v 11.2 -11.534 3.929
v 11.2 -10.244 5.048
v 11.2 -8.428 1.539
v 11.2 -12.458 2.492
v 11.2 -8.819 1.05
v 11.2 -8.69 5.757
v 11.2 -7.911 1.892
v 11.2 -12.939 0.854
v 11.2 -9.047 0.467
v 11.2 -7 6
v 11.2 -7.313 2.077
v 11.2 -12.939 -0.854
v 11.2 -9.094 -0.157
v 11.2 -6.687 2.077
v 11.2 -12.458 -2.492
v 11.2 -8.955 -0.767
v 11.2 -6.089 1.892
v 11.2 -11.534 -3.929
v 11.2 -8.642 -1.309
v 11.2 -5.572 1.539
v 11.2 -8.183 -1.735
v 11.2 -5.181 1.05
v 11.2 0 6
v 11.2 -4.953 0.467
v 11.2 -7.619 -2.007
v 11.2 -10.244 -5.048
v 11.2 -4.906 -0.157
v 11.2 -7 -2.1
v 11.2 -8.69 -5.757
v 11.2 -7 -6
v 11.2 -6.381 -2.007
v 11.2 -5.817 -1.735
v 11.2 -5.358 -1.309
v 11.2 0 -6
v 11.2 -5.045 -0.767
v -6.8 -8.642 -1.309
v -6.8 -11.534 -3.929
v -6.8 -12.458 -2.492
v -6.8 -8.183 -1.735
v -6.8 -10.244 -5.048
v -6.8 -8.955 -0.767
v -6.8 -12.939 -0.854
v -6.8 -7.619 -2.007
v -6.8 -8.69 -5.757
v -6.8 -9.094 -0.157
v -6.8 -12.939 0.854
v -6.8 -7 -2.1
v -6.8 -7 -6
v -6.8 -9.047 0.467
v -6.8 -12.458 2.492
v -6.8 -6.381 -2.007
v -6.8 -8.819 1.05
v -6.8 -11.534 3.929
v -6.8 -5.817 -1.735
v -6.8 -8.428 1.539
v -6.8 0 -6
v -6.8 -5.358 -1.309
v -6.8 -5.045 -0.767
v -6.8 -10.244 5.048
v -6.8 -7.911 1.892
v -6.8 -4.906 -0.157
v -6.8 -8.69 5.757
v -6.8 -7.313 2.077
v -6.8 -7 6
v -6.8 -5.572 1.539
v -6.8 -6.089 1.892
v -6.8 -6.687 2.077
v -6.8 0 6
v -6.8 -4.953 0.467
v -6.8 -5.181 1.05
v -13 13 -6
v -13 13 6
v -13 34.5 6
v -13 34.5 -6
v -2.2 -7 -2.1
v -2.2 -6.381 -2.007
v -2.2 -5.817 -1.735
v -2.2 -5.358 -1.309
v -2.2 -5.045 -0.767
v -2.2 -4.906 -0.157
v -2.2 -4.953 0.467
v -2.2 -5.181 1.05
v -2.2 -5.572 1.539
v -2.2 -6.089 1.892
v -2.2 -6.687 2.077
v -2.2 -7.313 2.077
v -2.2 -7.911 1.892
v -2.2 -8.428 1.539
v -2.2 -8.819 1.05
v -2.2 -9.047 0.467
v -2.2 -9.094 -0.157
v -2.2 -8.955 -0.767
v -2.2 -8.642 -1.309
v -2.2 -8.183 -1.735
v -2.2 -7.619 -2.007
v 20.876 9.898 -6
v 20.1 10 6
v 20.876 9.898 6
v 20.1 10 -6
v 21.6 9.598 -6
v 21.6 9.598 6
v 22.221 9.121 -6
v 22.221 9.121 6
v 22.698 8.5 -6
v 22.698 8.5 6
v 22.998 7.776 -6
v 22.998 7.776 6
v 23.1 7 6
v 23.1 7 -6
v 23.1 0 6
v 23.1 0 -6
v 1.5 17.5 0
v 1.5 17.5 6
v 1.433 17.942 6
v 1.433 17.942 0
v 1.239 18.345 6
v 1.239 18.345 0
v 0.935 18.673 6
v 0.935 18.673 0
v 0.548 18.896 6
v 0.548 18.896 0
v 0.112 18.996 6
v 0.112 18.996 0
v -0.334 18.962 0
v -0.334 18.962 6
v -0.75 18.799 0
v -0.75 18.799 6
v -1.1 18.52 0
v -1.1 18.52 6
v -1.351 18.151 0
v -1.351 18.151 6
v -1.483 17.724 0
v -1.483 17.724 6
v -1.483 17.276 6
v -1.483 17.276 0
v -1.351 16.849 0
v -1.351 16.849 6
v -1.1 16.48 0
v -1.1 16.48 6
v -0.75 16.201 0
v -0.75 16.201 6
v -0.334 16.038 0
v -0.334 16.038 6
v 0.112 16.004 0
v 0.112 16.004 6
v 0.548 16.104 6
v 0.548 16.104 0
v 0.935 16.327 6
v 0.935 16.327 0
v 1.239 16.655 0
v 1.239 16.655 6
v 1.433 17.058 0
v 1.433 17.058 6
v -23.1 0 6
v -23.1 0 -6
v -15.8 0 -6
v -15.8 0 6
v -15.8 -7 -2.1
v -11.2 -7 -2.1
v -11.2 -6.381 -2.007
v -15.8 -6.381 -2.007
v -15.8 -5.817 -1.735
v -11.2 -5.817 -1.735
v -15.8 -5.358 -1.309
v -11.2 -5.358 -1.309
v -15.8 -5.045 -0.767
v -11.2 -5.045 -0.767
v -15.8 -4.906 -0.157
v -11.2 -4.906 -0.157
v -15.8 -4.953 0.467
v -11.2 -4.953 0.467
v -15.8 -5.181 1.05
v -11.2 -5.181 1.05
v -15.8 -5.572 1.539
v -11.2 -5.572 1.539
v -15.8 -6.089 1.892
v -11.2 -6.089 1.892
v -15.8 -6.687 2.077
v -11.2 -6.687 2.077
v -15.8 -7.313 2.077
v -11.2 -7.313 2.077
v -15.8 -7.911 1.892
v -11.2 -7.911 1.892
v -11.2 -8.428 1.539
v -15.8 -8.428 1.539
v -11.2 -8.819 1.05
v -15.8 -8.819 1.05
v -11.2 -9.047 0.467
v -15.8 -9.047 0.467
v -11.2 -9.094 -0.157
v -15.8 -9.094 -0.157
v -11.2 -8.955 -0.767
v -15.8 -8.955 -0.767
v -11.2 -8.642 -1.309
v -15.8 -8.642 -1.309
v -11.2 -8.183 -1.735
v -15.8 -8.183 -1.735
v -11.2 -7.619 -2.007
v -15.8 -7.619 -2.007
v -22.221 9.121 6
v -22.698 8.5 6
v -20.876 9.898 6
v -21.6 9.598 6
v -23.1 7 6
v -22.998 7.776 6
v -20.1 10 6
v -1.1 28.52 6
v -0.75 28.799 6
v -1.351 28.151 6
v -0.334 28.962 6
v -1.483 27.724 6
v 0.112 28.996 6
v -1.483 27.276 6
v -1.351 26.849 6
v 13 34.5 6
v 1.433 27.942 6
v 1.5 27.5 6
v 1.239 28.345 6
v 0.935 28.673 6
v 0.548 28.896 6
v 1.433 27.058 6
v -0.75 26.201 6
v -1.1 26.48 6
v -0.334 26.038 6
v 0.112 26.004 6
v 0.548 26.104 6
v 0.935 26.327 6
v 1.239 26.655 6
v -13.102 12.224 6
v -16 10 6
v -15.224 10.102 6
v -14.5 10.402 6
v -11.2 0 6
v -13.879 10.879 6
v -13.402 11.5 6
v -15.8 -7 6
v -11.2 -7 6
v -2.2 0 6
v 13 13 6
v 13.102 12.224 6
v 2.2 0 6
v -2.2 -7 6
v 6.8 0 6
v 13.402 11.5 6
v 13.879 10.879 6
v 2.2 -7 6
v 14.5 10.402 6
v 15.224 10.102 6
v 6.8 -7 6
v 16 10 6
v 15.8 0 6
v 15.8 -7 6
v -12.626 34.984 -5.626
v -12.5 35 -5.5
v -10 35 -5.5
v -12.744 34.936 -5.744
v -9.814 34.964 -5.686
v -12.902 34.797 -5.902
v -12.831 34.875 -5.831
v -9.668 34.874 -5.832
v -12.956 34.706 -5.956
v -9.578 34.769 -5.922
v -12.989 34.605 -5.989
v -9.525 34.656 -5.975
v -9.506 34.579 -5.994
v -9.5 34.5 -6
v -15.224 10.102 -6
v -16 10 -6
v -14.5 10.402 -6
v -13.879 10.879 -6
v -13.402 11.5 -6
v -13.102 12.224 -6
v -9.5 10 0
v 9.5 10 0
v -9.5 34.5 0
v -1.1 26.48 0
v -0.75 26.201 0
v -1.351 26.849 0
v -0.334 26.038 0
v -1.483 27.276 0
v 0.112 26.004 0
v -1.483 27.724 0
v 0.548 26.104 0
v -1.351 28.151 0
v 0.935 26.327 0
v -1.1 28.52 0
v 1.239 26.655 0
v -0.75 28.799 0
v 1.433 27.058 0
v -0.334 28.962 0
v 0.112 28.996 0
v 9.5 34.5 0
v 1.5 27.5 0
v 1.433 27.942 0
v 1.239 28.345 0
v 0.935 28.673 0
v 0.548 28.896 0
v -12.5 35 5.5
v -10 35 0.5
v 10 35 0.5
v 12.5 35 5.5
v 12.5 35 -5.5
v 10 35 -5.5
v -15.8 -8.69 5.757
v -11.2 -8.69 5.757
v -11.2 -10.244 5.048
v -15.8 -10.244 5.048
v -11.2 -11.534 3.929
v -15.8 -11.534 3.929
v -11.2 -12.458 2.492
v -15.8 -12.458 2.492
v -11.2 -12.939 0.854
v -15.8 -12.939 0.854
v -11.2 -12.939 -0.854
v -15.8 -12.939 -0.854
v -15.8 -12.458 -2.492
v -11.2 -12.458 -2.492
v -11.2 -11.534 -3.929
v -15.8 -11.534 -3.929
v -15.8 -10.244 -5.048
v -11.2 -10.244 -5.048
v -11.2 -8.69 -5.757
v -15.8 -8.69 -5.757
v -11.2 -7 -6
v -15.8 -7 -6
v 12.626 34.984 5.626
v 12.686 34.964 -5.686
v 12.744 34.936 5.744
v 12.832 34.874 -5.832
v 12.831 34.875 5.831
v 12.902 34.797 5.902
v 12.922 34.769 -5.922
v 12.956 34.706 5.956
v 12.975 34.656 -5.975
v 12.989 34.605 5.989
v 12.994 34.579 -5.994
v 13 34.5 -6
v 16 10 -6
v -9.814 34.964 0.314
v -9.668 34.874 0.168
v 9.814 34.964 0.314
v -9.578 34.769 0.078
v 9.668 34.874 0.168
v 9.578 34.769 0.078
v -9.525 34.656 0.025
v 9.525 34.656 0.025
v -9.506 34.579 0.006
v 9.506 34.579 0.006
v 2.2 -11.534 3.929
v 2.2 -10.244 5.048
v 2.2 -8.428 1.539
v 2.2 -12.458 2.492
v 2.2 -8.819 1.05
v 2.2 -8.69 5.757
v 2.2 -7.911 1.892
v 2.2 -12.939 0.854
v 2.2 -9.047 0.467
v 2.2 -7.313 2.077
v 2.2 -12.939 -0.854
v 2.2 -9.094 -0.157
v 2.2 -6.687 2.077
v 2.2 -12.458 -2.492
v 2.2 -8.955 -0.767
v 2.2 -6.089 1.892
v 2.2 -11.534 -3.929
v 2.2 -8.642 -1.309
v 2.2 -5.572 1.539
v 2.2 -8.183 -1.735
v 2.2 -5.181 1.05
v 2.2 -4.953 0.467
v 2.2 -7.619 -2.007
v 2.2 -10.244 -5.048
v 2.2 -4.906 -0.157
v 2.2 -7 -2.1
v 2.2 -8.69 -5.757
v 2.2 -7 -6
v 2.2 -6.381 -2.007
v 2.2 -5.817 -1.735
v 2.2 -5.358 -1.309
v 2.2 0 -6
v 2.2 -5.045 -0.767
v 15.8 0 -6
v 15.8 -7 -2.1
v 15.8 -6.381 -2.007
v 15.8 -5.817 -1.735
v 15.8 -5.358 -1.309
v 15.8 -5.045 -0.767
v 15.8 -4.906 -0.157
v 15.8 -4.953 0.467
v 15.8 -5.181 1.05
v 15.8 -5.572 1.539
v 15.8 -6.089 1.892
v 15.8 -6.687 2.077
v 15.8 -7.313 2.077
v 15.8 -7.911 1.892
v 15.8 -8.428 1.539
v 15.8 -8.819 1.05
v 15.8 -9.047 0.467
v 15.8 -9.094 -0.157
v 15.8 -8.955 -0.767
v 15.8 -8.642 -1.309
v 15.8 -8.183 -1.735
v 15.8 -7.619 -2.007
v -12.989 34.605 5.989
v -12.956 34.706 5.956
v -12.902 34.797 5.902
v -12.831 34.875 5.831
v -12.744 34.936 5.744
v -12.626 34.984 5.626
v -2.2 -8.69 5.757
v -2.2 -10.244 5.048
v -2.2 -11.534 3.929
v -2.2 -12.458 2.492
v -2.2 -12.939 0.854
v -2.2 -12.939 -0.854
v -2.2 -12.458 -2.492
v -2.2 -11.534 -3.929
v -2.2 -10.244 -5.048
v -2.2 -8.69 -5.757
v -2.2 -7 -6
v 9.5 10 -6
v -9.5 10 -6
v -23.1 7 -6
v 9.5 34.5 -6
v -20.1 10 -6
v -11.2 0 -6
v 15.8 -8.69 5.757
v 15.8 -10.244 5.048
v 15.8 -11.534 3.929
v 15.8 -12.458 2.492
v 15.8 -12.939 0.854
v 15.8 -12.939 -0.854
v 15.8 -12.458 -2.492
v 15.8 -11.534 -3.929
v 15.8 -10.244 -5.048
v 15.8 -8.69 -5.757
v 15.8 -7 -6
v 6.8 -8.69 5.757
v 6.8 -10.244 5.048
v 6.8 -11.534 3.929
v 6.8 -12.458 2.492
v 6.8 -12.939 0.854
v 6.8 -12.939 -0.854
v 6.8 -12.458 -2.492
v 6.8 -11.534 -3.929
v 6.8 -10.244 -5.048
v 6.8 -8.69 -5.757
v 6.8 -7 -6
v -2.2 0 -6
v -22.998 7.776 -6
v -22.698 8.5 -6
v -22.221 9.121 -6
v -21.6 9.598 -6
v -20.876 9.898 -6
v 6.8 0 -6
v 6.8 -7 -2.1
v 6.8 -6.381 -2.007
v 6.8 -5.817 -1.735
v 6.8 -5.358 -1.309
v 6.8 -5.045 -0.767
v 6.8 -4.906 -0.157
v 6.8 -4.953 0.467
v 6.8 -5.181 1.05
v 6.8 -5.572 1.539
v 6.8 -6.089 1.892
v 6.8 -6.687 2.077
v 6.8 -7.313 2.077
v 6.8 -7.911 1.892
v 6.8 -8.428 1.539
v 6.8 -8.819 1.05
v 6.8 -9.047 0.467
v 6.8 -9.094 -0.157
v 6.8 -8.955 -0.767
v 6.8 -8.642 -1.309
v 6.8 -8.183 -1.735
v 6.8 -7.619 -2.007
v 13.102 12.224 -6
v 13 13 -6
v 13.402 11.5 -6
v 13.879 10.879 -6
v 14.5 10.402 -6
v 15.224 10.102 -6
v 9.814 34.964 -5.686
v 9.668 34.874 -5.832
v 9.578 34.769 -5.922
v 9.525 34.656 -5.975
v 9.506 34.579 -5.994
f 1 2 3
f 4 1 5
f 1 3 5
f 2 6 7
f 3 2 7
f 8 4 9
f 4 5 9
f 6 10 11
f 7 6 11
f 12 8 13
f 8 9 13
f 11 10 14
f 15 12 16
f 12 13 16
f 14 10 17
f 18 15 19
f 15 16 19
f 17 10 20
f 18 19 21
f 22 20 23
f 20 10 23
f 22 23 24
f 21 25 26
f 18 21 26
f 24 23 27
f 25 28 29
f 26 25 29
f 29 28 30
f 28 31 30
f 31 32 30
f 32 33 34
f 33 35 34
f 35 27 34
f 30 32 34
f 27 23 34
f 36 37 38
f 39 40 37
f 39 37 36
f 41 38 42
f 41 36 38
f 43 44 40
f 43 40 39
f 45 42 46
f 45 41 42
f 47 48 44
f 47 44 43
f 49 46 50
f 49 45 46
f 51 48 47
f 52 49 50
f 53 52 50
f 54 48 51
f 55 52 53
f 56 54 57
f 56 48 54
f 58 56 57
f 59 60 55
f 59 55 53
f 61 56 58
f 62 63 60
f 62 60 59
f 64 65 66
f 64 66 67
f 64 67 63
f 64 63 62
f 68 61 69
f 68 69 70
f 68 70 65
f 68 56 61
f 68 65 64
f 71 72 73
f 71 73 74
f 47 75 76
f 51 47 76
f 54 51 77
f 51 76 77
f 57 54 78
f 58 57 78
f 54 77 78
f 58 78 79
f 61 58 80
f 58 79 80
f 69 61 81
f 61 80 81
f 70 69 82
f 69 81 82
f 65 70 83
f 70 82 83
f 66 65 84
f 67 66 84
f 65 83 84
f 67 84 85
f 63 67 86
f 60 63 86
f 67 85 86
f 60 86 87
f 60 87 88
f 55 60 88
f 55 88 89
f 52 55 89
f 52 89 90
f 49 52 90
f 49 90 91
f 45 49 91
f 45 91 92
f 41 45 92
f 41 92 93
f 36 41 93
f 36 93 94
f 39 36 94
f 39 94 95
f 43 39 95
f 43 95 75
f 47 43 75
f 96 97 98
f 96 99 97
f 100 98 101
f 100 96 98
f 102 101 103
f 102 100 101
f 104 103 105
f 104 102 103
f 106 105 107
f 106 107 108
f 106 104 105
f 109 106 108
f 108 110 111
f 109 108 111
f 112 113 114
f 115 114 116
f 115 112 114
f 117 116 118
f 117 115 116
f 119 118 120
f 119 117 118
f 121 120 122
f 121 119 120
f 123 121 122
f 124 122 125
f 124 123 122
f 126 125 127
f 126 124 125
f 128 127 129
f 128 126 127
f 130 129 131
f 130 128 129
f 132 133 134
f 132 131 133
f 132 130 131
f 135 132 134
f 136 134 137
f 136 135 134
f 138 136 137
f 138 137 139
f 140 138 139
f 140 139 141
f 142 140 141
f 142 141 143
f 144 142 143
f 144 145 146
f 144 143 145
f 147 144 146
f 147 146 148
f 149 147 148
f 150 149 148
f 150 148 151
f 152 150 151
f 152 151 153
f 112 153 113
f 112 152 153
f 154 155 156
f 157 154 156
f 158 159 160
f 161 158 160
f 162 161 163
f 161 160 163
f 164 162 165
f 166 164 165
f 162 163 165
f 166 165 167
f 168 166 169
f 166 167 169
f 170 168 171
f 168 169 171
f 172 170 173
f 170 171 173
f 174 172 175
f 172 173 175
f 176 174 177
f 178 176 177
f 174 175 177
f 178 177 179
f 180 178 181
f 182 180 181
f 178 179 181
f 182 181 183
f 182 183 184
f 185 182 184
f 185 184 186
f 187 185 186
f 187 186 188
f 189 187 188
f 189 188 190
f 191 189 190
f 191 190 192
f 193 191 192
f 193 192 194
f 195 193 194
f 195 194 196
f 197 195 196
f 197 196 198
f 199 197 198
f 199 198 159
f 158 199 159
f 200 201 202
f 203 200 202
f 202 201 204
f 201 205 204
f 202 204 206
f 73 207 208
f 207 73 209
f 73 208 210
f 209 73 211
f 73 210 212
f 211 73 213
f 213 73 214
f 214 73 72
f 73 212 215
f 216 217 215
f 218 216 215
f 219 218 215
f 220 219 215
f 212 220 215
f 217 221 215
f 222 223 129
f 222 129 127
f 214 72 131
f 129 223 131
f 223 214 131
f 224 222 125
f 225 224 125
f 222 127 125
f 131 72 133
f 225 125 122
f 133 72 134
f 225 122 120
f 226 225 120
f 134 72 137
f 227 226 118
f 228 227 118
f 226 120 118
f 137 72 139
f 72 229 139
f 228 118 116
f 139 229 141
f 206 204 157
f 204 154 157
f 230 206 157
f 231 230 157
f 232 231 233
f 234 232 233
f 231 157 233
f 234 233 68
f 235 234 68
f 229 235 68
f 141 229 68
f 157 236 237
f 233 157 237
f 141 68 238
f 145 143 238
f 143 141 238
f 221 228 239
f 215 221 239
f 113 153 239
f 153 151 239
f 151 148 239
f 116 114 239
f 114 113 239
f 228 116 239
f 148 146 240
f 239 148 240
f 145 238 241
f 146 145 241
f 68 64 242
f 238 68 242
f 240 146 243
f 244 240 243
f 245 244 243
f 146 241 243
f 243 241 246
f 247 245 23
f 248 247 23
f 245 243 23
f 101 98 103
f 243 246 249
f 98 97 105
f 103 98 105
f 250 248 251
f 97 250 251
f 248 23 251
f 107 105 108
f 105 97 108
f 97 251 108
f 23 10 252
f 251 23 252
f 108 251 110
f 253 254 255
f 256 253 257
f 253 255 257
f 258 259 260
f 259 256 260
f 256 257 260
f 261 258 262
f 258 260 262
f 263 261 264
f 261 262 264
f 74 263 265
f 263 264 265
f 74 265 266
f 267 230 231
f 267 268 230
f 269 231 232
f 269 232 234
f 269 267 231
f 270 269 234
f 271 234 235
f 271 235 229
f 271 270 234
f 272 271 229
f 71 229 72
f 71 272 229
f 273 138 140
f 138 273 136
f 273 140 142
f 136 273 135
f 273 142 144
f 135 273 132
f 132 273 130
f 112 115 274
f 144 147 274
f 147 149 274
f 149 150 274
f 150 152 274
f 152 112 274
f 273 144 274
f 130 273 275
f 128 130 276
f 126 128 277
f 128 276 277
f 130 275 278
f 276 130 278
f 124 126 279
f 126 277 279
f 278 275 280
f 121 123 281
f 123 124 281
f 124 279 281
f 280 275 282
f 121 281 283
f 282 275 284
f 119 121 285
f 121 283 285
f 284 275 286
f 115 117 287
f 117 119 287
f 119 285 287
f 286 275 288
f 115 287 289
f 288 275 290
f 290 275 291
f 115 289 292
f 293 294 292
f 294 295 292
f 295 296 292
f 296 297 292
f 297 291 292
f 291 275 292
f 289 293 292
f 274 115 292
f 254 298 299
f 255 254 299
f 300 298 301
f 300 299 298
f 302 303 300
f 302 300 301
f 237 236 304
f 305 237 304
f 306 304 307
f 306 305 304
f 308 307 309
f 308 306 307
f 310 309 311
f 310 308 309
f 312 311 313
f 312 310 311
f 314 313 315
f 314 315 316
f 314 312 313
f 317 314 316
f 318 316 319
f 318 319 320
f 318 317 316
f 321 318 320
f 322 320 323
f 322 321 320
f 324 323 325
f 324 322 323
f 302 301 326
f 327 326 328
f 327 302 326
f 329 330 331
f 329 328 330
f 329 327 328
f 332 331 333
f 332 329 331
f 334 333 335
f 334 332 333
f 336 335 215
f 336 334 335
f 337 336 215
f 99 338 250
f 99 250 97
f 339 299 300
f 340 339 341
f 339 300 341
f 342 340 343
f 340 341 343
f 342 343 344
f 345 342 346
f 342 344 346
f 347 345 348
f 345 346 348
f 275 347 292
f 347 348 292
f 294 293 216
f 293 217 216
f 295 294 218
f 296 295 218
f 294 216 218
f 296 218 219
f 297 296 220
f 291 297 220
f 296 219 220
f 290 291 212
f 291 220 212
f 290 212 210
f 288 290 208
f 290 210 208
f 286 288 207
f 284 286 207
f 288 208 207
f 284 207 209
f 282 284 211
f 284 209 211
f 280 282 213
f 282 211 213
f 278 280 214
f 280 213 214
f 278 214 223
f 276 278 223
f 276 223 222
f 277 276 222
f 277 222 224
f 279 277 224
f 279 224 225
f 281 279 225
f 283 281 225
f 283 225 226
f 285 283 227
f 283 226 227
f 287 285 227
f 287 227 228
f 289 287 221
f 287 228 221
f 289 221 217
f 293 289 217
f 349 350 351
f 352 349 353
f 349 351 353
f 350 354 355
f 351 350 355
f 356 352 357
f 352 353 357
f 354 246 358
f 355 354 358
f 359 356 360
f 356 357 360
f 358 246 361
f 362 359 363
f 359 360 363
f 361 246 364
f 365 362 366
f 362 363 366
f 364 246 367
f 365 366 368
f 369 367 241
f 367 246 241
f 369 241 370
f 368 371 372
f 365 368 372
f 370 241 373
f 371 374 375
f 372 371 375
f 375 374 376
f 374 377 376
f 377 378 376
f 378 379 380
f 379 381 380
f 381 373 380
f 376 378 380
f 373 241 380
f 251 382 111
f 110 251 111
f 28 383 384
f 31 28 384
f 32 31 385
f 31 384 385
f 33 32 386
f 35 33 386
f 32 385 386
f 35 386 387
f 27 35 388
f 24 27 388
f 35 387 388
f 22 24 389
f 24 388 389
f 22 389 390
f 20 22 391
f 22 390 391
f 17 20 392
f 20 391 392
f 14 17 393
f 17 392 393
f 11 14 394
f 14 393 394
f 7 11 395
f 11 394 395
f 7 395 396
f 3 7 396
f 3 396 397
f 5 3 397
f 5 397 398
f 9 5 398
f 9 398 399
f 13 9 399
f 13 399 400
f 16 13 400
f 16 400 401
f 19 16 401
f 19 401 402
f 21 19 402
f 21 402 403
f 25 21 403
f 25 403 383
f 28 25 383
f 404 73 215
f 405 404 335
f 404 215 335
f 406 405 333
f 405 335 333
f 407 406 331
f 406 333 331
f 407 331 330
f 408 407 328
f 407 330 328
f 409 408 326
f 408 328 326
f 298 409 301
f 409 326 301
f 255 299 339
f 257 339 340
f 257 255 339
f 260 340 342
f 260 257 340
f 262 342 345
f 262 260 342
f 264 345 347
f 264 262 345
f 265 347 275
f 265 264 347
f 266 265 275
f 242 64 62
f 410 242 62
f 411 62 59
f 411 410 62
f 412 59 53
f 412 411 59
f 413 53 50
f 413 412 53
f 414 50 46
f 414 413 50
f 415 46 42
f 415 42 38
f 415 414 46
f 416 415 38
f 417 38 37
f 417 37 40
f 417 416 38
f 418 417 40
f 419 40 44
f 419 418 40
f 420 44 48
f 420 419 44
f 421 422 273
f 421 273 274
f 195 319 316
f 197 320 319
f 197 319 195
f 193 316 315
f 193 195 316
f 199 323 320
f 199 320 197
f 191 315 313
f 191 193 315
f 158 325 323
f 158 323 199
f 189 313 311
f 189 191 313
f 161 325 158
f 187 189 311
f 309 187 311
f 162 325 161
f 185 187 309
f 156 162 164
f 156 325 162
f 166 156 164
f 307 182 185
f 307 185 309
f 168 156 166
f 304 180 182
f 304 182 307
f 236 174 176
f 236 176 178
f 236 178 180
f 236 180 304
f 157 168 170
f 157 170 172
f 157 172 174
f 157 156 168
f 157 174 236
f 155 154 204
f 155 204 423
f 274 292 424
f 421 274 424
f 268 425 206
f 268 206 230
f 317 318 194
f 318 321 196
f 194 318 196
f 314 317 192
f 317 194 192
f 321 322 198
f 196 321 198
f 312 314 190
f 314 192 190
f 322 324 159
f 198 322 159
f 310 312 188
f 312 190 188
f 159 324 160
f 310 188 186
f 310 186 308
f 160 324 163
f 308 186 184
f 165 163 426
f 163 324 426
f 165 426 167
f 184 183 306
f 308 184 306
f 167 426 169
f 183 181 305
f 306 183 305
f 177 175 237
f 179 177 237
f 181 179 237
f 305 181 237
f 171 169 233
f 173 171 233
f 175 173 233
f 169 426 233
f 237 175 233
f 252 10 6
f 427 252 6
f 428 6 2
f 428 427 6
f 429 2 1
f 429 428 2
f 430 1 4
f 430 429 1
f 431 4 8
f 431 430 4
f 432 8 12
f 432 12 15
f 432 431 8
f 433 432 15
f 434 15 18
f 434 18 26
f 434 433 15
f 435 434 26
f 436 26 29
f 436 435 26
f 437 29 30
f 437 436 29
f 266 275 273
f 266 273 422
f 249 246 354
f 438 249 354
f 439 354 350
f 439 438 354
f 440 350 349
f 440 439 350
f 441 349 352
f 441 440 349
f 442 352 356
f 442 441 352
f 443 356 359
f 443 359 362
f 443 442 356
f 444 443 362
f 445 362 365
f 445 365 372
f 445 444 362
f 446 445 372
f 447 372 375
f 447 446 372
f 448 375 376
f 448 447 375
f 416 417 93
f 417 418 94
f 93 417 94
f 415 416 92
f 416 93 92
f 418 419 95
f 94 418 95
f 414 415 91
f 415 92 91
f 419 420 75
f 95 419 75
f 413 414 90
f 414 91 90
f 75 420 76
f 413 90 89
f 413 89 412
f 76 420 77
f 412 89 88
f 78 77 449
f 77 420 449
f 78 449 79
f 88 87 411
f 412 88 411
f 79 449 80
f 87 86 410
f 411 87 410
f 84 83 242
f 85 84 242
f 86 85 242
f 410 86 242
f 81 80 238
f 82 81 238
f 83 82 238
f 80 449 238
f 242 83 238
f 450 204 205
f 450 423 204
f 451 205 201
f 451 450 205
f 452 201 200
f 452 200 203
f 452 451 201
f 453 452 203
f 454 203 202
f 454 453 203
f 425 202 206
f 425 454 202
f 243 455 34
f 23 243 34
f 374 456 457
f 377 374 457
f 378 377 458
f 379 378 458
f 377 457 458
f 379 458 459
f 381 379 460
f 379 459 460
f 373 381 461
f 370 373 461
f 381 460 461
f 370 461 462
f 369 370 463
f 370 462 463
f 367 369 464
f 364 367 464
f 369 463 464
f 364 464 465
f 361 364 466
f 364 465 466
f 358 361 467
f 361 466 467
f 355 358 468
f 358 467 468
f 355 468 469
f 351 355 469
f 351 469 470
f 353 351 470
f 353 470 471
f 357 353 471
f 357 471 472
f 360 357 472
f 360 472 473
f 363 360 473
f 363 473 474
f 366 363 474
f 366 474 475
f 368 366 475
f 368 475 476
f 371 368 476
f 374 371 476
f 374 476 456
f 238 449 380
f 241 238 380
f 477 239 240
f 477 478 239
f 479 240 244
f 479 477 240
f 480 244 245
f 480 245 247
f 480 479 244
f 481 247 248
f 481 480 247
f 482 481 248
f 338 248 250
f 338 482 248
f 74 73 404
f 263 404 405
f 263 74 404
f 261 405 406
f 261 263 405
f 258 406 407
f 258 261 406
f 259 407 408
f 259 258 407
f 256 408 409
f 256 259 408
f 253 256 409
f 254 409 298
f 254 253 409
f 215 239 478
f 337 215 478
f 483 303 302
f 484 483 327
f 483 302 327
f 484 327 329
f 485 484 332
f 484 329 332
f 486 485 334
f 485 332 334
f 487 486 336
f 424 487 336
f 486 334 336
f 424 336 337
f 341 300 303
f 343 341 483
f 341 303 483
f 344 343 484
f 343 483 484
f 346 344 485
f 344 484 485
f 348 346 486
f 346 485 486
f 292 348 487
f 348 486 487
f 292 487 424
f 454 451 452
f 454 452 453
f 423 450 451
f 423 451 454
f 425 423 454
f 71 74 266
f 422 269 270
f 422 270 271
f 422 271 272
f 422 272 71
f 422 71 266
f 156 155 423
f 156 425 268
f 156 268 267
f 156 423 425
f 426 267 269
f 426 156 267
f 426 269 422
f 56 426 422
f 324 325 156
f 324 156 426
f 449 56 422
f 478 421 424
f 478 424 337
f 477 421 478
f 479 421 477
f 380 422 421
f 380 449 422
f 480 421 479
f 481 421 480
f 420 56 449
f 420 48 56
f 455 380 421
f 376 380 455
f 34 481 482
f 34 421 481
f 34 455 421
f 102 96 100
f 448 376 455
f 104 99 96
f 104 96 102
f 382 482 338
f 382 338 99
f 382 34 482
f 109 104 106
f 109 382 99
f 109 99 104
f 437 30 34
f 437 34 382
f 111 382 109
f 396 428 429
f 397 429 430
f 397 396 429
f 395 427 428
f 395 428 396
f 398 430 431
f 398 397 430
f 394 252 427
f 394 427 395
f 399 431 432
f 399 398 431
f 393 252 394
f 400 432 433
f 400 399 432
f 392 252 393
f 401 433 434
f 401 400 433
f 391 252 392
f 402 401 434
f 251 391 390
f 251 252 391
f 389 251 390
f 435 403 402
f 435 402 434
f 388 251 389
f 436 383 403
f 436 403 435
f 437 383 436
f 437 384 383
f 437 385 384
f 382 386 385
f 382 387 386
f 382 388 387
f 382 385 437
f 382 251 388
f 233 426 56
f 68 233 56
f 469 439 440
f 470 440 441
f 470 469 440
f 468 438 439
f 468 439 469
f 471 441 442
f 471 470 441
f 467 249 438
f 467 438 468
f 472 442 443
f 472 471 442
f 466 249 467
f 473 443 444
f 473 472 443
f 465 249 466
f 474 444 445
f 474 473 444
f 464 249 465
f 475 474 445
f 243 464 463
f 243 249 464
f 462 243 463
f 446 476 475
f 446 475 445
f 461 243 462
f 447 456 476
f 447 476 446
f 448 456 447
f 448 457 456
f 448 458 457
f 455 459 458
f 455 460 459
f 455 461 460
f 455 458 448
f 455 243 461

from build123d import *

# Parameters (mm, degrees)
SKETCH1_W           = 46.2
SKETCH1_H           = 12
BOSS_EXTRUDE1_DEPTH = 10
SKETCH2_W           = 4.6
SKETCH2_H           = 12
BOSS_EXTRUDE2_DEPTH = 7
SKETCH8_R           = 6
BOSS_EXTRUDE3_DEPTH = 4.6
LPATTERN1_COUNT     = 4
LPATTERN1_PITCH     = 9
SKETCH4_R           = 2.1
CUT_EXTRUDE1_DEPTH  = 39.9
SKETCH10_W          = 26
SKETCH10_H          = 12
BOSS_EXTRUDE4_DEPTH = 25
SKETCH11_W          = 19
SKETCH11_H          = 6
CUT_EXTRUDE2_DEPTH  = 25
FILLET1_R           = 3
FILLET2_R           = 0.5
SKETCH12_R          = 1.5
CUT_EXTRUDE3_DEPTH  = 10


with BuildPart() as part:
    # Sketch1 → Boss-Extrude1 (new body)
    with BuildSketch(Plane(origin=(0, 0, 0), x_dir=(1, 0, 0), z_dir=(0, 1, 0))):
        Rectangle(SKETCH1_W, SKETCH1_H)
    extrude(amount=BOSS_EXTRUDE1_DEPTH)

    # Sketch2 → Boss-Extrude2 (add)
    with BuildSketch(Plane.XZ):
        with Locations((13.5, 0)):
            Rectangle(SKETCH2_W, SKETCH2_H)
    boss_extrude2 = extrude(amount=BOSS_EXTRUDE2_DEPTH)

    # Sketch8 → Boss-Extrude3 (add)
    with BuildSketch(Plane(origin=(15.8, 0, 0), x_dir=(0, 0, -1), z_dir=(1, 0, 0))):
        with Locations((0, -7)):
            Circle(SKETCH8_R)
    boss_extrude3 = extrude(amount=-BOSS_EXTRUDE3_DEPTH)

    # LPattern1: Boss-Extrude2, Boss-Extrude3 ×4
    with Locations(*[(-i * LPATTERN1_PITCH, 0, 0) for i in range(1, LPATTERN1_COUNT)]):
        add(boss_extrude2)
        add(boss_extrude3)

    # Sketch4 → Cut-Extrude1 (cut, through all)
    with BuildSketch(Plane(origin=(15.8, 0, 0), x_dir=(0, 0, -1), z_dir=(1, 0, 0))):
        with Locations((0, -7)):
            Circle(SKETCH4_R)
    extrude(amount=-CUT_EXTRUDE1_DEPTH, mode=Mode.SUBTRACT)

    # Sketch10 → Boss-Extrude4 (add)
    with BuildSketch(Plane(origin=(0, 10, 0), x_dir=(1, 0, 0), z_dir=(0, 1, 0))):
        Rectangle(SKETCH10_W, SKETCH10_H)
    extrude(amount=BOSS_EXTRUDE4_DEPTH)

    # Sketch11 → Cut-Extrude2 (cut)
    with BuildSketch(Plane(origin=(0, 35, 0), x_dir=(1, 0, 0), z_dir=(0, 1, 0))):
        with Locations((0, 3)):
            Rectangle(SKETCH11_W, SKETCH11_H)
    extrude(amount=-CUT_EXTRUDE2_DEPTH, mode=Mode.SUBTRACT)

    # Fillet1
    fillet1_edges = [part.edges().sort_by_distance(p)[0] for p in [
        (-13, 10, 0),
        (13, 10, 0),
        (23.1, 10, 0),
        (-23.1, 10, 0),
    ]]
    fillet(fillet1_edges, radius=FILLET1_R)

    # Fillet2
    fillet2_edges = [part.edges().sort_by_distance(p)[0] for p in [
        (-13, 35, 0),
        (0, 35, 6),
        (13, 35, 0),
        (11.25, 35, -6),
        (-11.25, 35, -6),
        (-9.5, 35, -3),
        (0, 35, 0),
        (9.5, 35, -3),
    ]]
    fillet(fillet2_edges, radius=FILLET2_R)

    # Sketch12 → Cut-Extrude3 (cut, symmetric)
    with BuildSketch(Plane.XY):
        with Locations((0, 17.5)):
            Circle(SKETCH12_R)
        with Locations((0, 27.5)):
            Circle(SKETCH12_R)
    extrude(amount=CUT_EXTRUDE3_DEPTH, both=True, mode=Mode.SUBTRACT)


solid = part.part
